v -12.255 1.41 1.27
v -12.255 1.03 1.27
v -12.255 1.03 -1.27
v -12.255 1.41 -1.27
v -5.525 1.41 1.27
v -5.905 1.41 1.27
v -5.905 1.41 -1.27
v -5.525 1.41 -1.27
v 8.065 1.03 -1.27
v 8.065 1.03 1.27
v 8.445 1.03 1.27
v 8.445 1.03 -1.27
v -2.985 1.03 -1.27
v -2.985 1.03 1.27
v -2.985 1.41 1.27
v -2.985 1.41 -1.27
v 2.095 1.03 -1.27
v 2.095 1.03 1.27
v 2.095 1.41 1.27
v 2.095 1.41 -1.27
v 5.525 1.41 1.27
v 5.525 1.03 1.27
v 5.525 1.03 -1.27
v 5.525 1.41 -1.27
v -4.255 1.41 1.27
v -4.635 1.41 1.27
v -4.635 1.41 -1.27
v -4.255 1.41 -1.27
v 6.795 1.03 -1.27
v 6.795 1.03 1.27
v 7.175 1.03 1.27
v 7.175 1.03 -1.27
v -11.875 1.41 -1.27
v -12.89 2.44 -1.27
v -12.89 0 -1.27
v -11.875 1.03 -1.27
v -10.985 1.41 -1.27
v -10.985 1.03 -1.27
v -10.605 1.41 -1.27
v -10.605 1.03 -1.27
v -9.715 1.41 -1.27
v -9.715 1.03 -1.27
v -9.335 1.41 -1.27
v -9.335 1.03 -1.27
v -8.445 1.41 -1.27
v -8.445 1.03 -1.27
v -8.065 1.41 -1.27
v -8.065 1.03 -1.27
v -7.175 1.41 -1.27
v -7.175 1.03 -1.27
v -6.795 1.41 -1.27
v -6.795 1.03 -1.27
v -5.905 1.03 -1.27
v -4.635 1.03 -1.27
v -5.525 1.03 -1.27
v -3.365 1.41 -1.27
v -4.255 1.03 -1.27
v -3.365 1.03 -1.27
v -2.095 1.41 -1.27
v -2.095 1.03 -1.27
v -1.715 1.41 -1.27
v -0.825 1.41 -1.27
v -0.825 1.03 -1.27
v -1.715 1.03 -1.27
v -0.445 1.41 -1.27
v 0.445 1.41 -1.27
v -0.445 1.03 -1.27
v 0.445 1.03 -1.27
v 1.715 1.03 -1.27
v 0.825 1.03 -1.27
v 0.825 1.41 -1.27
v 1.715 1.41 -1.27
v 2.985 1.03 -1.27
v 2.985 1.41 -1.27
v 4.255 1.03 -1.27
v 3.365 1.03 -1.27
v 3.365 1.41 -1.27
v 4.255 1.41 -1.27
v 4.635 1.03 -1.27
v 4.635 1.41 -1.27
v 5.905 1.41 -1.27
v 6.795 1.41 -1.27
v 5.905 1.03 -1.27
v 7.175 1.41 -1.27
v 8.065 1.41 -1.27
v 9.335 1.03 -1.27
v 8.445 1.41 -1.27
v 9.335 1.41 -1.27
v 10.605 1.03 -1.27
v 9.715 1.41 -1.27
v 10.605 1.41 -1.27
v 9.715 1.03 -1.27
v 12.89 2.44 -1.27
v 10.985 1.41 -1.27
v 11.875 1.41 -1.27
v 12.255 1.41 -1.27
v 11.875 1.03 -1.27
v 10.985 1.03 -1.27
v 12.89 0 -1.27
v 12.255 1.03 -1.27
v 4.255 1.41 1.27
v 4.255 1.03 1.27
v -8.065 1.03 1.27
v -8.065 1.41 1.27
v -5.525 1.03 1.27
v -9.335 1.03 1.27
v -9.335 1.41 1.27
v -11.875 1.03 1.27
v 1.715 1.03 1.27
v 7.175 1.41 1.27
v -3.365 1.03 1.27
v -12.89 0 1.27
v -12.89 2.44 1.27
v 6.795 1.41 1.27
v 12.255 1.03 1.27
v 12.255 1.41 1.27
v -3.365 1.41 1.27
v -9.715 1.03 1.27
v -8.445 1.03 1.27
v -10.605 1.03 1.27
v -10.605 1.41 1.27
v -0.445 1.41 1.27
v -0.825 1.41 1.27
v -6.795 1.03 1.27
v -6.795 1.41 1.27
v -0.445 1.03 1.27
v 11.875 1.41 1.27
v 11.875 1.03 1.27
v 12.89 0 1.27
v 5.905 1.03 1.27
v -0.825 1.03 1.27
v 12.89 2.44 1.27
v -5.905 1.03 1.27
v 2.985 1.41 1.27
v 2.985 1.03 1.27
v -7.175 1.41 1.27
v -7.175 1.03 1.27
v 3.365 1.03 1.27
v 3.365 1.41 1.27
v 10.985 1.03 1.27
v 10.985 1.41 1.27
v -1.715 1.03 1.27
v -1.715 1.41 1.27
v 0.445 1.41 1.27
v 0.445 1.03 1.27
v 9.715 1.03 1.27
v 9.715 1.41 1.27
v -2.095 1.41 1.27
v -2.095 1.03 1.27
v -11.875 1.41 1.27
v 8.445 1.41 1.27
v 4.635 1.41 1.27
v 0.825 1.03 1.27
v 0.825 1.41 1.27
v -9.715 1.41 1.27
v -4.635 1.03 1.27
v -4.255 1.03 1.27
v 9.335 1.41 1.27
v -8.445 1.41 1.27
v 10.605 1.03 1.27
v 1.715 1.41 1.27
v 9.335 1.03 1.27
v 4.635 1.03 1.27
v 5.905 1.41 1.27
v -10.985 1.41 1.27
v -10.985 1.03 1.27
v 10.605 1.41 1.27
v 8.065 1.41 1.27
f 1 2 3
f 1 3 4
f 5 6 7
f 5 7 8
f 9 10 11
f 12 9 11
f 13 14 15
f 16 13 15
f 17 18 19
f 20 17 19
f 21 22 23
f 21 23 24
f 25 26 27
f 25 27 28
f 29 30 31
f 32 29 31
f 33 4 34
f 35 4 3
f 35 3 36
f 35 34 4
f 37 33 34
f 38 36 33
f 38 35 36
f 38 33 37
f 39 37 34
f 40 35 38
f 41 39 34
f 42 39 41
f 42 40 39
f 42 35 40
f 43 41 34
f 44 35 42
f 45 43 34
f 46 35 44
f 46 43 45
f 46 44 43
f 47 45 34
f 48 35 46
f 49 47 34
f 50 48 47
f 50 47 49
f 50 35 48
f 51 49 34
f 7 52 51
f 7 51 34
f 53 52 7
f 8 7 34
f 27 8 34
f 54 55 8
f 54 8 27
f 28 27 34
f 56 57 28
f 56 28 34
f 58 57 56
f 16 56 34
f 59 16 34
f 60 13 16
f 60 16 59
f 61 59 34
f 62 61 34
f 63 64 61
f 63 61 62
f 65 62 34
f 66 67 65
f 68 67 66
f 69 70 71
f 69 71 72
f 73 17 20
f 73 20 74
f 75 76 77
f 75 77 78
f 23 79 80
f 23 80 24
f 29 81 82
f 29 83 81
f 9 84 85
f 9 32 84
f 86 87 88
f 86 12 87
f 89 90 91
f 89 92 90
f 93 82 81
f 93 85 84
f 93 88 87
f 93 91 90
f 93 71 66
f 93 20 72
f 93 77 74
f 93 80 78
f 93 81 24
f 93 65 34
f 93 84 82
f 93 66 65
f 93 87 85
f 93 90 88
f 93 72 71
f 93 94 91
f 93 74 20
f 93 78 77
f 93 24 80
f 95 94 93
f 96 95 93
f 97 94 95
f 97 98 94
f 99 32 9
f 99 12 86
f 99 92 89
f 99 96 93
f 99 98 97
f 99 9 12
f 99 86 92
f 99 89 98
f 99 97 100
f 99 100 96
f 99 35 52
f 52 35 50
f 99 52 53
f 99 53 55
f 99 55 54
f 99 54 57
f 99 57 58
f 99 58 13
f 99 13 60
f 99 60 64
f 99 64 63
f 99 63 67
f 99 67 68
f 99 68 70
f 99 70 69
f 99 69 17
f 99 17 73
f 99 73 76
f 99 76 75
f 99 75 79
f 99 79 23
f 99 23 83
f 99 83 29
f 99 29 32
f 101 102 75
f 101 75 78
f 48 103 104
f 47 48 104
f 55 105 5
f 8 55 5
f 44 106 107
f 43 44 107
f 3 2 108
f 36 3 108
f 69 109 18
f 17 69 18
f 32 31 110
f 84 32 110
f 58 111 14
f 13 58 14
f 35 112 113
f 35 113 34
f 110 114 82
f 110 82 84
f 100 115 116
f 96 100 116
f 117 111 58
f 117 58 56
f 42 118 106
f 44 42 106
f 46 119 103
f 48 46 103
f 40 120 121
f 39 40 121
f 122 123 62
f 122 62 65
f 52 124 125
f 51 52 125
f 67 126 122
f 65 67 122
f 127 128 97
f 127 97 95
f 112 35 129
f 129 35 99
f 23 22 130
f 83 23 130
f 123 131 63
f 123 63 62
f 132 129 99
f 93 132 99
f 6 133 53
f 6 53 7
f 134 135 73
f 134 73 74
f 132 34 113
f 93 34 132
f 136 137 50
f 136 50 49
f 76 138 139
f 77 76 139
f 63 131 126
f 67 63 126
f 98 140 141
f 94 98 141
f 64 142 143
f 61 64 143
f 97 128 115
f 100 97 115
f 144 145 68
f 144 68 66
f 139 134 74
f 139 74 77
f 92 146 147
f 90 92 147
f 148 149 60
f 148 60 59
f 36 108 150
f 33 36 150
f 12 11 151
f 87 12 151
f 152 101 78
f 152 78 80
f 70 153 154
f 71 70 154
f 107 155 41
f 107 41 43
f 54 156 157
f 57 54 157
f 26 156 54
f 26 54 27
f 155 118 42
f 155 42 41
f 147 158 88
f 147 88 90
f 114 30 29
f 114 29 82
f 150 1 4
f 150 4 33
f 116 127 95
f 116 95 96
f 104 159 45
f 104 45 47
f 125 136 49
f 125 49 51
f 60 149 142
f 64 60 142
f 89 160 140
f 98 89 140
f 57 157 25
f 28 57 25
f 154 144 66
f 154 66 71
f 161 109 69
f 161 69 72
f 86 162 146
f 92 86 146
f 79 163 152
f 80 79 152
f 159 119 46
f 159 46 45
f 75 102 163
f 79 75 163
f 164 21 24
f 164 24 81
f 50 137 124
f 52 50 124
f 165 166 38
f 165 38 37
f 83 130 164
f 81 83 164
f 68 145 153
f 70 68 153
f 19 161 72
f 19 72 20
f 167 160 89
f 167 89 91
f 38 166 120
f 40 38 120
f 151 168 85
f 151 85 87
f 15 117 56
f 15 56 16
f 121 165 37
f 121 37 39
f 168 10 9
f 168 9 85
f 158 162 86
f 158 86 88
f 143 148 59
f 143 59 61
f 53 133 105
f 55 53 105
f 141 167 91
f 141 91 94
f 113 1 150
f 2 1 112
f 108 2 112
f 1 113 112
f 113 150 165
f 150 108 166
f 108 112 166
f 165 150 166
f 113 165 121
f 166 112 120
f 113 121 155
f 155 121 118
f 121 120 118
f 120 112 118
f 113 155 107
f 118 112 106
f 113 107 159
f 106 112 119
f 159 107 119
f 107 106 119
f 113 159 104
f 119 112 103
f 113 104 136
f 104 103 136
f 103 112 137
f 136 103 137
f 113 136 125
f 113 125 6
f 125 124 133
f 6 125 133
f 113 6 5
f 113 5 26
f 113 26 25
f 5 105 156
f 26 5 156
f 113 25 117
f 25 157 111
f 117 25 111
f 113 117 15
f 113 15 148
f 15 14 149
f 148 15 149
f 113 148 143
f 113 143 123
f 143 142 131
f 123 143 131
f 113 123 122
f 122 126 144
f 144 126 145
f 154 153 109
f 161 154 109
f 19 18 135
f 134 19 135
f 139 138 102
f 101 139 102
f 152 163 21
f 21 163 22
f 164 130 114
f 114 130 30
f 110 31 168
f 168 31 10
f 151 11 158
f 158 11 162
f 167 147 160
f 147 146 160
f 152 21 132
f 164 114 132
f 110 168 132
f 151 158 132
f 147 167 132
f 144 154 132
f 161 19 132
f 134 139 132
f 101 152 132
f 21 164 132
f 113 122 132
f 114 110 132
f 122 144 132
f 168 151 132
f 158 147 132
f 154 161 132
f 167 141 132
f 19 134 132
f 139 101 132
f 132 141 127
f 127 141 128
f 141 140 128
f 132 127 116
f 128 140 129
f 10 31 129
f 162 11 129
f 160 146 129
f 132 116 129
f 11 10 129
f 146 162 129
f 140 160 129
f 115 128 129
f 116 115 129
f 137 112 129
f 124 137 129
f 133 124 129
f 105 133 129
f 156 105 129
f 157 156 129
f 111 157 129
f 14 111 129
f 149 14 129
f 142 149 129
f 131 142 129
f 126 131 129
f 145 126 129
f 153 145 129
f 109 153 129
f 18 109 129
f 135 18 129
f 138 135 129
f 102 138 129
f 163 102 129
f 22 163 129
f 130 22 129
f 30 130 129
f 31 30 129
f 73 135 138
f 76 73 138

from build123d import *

# Parameters (mm, degrees)
SKETCH1_W           = 25.78
SKETCH1_H           = 2.54
BOSS_EXTRUDE1_DEPTH = 2.44
CUT_EXTRUDE1_REACH  = 4.54
SKETCH2_W           = 0.38
SKETCH2_H           = 0.38


with BuildPart() as part:
    # Sketch1 → Boss-Extrude1 (new body)
    with BuildSketch(Plane(origin=(0, 0, 0), x_dir=(1, 0, 0), z_dir=(0, 1, 0))):
        Rectangle(SKETCH1_W, SKETCH1_H)
    extrude(amount=BOSS_EXTRUDE1_DEPTH)

    # Sketch2 → Cut-Extrude1 (cut, up to next)
    with BuildSketch(Plane.XY.offset(1.27), mode=Mode.PRIVATE) as cut_extrude1_sk1:
        with Locations((-10.795, 1.22)):
            Rectangle(SKETCH2_W, SKETCH2_H)
    cut_extrude1_tool1 = extrude(cut_extrude1_sk1.sketch, amount=-CUT_EXTRUDE1_REACH, mode=Mode.PRIVATE) & part.part
    add(cut_extrude1_tool1.solids().sort_by_distance((-10.795, 1.22, 1.27))[0], mode=Mode.SUBTRACT)
    # Sketch2 → Cut-Extrude1 (cut, up to next)
    with BuildSketch(Plane.XY.offset(1.27), mode=Mode.PRIVATE) as cut_extrude1_sk2:
        with Locations((-12.065, 1.22)):
            Rectangle(SKETCH2_W, SKETCH2_H)
    cut_extrude1_tool2 = extrude(cut_extrude1_sk2.sketch, amount=-CUT_EXTRUDE1_REACH, mode=Mode.PRIVATE) & part.part
    add(cut_extrude1_tool2.solids().sort_by_distance((-12.065, 1.22, 1.27))[0], mode=Mode.SUBTRACT)
    # Sketch2 → Cut-Extrude1 (cut, up to next)
    with BuildSketch(Plane.XY.offset(1.27), mode=Mode.PRIVATE) as cut_extrude1_sk3:
        with Locations((-9.525, 1.22)):
            Rectangle(SKETCH2_W, SKETCH2_H)
    cut_extrude1_tool3 = extrude(cut_extrude1_sk3.sketch, amount=-CUT_EXTRUDE1_REACH, mode=Mode.PRIVATE) & part.part
    add(cut_extrude1_tool3.solids().sort_by_distance((-9.525, 1.22, 1.27))[0], mode=Mode.SUBTRACT)
    # Sketch2 → Cut-Extrude1 (cut, up to next)
    with BuildSketch(Plane.XY.offset(1.27), mode=Mode.PRIVATE) as cut_extrude1_sk4:
        with Locations((-8.255, 1.22)):
            Rectangle(SKETCH2_W, SKETCH2_H)
    cut_extrude1_tool4 = extrude(cut_extrude1_sk4.sketch, amount=-CUT_EXTRUDE1_REACH, mode=Mode.PRIVATE) & part.part
    add(cut_extrude1_tool4.solids().sort_by_distance((-8.255, 1.22, 1.27))[0], mode=Mode.SUBTRACT)
    # Sketch2 → Cut-Extrude1 (cut, up to next)
    with BuildSketch(Plane.XY.offset(1.27), mode=Mode.PRIVATE) as cut_extrude1_sk5:
        with Locations((-6.985, 1.22)):
            Rectangle(SKETCH2_W, SKETCH2_H)
    cut_extrude1_tool5 = extrude(cut_extrude1_sk5.sketch, amount=-CUT_EXTRUDE1_REACH, mode=Mode.PRIVATE) & part.part
    add(cut_extrude1_tool5.solids().sort_by_distance((-6.985, 1.22, 1.27))[0], mode=Mode.SUBTRACT)
    # Sketch2 → Cut-Extrude1 (cut, up to next)
    with BuildSketch(Plane.XY.offset(1.27), mode=Mode.PRIVATE) as cut_extrude1_sk6:
        with Locations((-5.715, 1.22)):
            Rectangle(SKETCH2_W, SKETCH2_H)
    cut_extrude1_tool6 = extrude(cut_extrude1_sk6.sketch, amount=-CUT_EXTRUDE1_REACH, mode=Mode.PRIVATE) & part.part
    add(cut_extrude1_tool6.solids().sort_by_distance((-5.715, 1.22, 1.27))[0], mode=Mode.SUBTRACT)
    # Sketch2 → Cut-Extrude1 (cut, up to next)
    with BuildSketch(Plane.XY.offset(1.27), mode=Mode.PRIVATE) as cut_extrude1_sk7:
        with Locations((-4.445, 1.22)):
            Rectangle(SKETCH2_W, SKETCH2_H)
    cut_extrude1_tool7 = extrude(cut_extrude1_sk7.sketch, amount=-CUT_EXTRUDE1_REACH, mode=Mode.PRIVATE) & part.part
    add(cut_extrude1_tool7.solids().sort_by_distance((-4.445, 1.22, 1.27))[0], mode=Mode.SUBTRACT)
    # Sketch2 → Cut-Extrude1 (cut, up to next)
    with BuildSketch(Plane.XY.offset(1.27), mode=Mode.PRIVATE) as cut_extrude1_sk8:
        with Locations((-3.175, 1.22)):
            Rectangle(SKETCH2_W, SKETCH2_H)
    cut_extrude1_tool8 = extrude(cut_extrude1_sk8.sketch, amount=-CUT_EXTRUDE1_REACH, mode=Mode.PRIVATE) & part.part
    add(cut_extrude1_tool8.solids().sort_by_distance((-3.175, 1.22, 1.27))[0], mode=Mode.SUBTRACT)
    # Sketch2 → Cut-Extrude1 (cut, up to next)
    with BuildSketch(Plane.XY.offset(1.27), mode=Mode.PRIVATE) as cut_extrude1_sk9:
        with Locations((-1.905, 1.22)):
            Rectangle(SKETCH2_W, SKETCH2_H)
    cut_extrude1_tool9 = extrude(cut_extrude1_sk9.sketch, amount=-CUT_EXTRUDE1_REACH, mode=Mode.PRIVATE) & part.part
    add(cut_extrude1_tool9.solids().sort_by_distance((-1.905, 1.22, 1.27))[0], mode=Mode.SUBTRACT)
    # Sketch2 → Cut-Extrude1 (cut, up to next)
    with BuildSketch(Plane.XY.offset(1.27), mode=Mode.PRIVATE) as cut_extrude1_sk10:
        with Locations((-0.635, 1.22)):
            Rectangle(SKETCH2_W, SKETCH2_H)
    cut_extrude1_tool10 = extrude(cut_extrude1_sk10.sketch, amount=-CUT_EXTRUDE1_REACH, mode=Mode.PRIVATE) & part.part
    add(cut_extrude1_tool10.solids().sort_by_distance((-0.635, 1.22, 1.27))[0], mode=Mode.SUBTRACT)
    # Sketch2 → Cut-Extrude1 (cut, up to next)
    with BuildSketch(Plane.XY.offset(1.27), mode=Mode.PRIVATE) as cut_extrude1_sk11:
        with Locations((0.635, 1.22)):
            Rectangle(SKETCH2_W, SKETCH2_H)
    cut_extrude1_tool11 = extrude(cut_extrude1_sk11.sketch, amount=-CUT_EXTRUDE1_REACH, mode=Mode.PRIVATE) & part.part
    add(cut_extrude1_tool11.solids().sort_by_distance((0.635, 1.22, 1.27))[0], mode=Mode.SUBTRACT)
    # Sketch2 → Cut-Extrude1 (cut, up to next)
    with BuildSketch(Plane.XY.offset(1.27), mode=Mode.PRIVATE) as cut_extrude1_sk12:
        with Locations((1.905, 1.22)):
            Rectangle(SKETCH2_W, SKETCH2_H)
    cut_extrude1_tool12 = extrude(cut_extrude1_sk12.sketch, amount=-CUT_EXTRUDE1_REACH, mode=Mode.PRIVATE) & part.part
    add(cut_extrude1_tool12.solids().sort_by_distance((1.905, 1.22, 1.27))[0], mode=Mode.SUBTRACT)
    # Sketch2 → Cut-Extrude1 (cut, up to next)
    with BuildSketch(Plane.XY.offset(1.27), mode=Mode.PRIVATE) as cut_extrude1_sk13:
        with Locations((3.175, 1.22)):
            Rectangle(SKETCH2_W, SKETCH2_H)
    cut_extrude1_tool13 = extrude(cut_extrude1_sk13.sketch, amount=-CUT_EXTRUDE1_REACH, mode=Mode.PRIVATE) & part.part
    add(cut_extrude1_tool13.solids().sort_by_distance((3.175, 1.22, 1.27))[0], mode=Mode.SUBTRACT)
    # Sketch2 → Cut-Extrude1 (cut, up to next)
    with BuildSketch(Plane.XY.offset(1.27), mode=Mode.PRIVATE) as cut_extrude1_sk14:
        with Locations((4.445, 1.22)):
            Rectangle(SKETCH2_W, SKETCH2_H)
    cut_extrude1_tool14 = extrude(cut_extrude1_sk14.sketch, amount=-CUT_EXTRUDE1_REACH, mode=Mode.PRIVATE) & part.part
    add(cut_extrude1_tool14.solids().sort_by_distance((4.445, 1.22, 1.27))[0], mode=Mode.SUBTRACT)
    # Sketch2 → Cut-Extrude1 (cut, up to next)
    with BuildSketch(Plane.XY.offset(1.27), mode=Mode.PRIVATE) as cut_extrude1_sk15:
        with Locations((5.715, 1.22)):
            Rectangle(SKETCH2_W, SKETCH2_H)
    cut_extrude1_tool15 = extrude(cut_extrude1_sk15.sketch, amount=-CUT_EXTRUDE1_REACH, mode=Mode.PRIVATE) & part.part
    add(cut_extrude1_tool15.solids().sort_by_distance((5.715, 1.22, 1.27))[0], mode=Mode.SUBTRACT)
    # Sketch2 → Cut-Extrude1 (cut, up to next)
    with BuildSketch(Plane.XY.offset(1.27), mode=Mode.PRIVATE) as cut_extrude1_sk16:
        with Locations((6.985, 1.22)):
            Rectangle(SKETCH2_W, SKETCH2_H)
    cut_extrude1_tool16 = extrude(cut_extrude1_sk16.sketch, amount=-CUT_EXTRUDE1_REACH, mode=Mode.PRIVATE) & part.part
    add(cut_extrude1_tool16.solids().sort_by_distance((6.985, 1.22, 1.27))[0], mode=Mode.SUBTRACT)
    # Sketch2 → Cut-Extrude1 (cut, up to next)
    with BuildSketch(Plane.XY.offset(1.27), mode=Mode.PRIVATE) as cut_extrude1_sk17:
        with Locations((8.255, 1.22)):
            Rectangle(SKETCH2_W, SKETCH2_H)
    cut_extrude1_tool17 = extrude(cut_extrude1_sk17.sketch, amount=-CUT_EXTRUDE1_REACH, mode=Mode.PRIVATE) & part.part
    add(cut_extrude1_tool17.solids().sort_by_distance((8.255, 1.22, 1.27))[0], mode=Mode.SUBTRACT)
    # Sketch2 → Cut-Extrude1 (cut, up to next)
    with BuildSketch(Plane.XY.offset(1.27), mode=Mode.PRIVATE) as cut_extrude1_sk18:
        with Locations((9.525, 1.22)):
            Rectangle(SKETCH2_W, SKETCH2_H)
    cut_extrude1_tool18 = extrude(cut_extrude1_sk18.sketch, amount=-CUT_EXTRUDE1_REACH, mode=Mode.PRIVATE) & part.part
    add(cut_extrude1_tool18.solids().sort_by_distance((9.525, 1.22, 1.27))[0], mode=Mode.SUBTRACT)
    # Sketch2 → Cut-Extrude1 (cut, up to next)
    with BuildSketch(Plane.XY.offset(1.27), mode=Mode.PRIVATE) as cut_extrude1_sk19:
        with Locations((10.795, 1.22)):
            Rectangle(SKETCH2_W, SKETCH2_H)
    cut_extrude1_tool19 = extrude(cut_extrude1_sk19.sketch, amount=-CUT_EXTRUDE1_REACH, mode=Mode.PRIVATE) & part.part
    add(cut_extrude1_tool19.solids().sort_by_distance((10.795, 1.22, 1.27))[0], mode=Mode.SUBTRACT)
    # Sketch2 → Cut-Extrude1 (cut, up to next)
    with BuildSketch(Plane.XY.offset(1.27), mode=Mode.PRIVATE) as cut_extrude1_sk20:
        with Locations((12.065, 1.22)):
            Rectangle(SKETCH2_W, SKETCH2_H)
    cut_extrude1_tool20 = extrude(cut_extrude1_sk20.sketch, amount=-CUT_EXTRUDE1_REACH, mode=Mode.PRIVATE) & part.part
    add(cut_extrude1_tool20.solids().sort_by_distance((12.065, 1.22, 1.27))[0], mode=Mode.SUBTRACT)


solid = part.part
